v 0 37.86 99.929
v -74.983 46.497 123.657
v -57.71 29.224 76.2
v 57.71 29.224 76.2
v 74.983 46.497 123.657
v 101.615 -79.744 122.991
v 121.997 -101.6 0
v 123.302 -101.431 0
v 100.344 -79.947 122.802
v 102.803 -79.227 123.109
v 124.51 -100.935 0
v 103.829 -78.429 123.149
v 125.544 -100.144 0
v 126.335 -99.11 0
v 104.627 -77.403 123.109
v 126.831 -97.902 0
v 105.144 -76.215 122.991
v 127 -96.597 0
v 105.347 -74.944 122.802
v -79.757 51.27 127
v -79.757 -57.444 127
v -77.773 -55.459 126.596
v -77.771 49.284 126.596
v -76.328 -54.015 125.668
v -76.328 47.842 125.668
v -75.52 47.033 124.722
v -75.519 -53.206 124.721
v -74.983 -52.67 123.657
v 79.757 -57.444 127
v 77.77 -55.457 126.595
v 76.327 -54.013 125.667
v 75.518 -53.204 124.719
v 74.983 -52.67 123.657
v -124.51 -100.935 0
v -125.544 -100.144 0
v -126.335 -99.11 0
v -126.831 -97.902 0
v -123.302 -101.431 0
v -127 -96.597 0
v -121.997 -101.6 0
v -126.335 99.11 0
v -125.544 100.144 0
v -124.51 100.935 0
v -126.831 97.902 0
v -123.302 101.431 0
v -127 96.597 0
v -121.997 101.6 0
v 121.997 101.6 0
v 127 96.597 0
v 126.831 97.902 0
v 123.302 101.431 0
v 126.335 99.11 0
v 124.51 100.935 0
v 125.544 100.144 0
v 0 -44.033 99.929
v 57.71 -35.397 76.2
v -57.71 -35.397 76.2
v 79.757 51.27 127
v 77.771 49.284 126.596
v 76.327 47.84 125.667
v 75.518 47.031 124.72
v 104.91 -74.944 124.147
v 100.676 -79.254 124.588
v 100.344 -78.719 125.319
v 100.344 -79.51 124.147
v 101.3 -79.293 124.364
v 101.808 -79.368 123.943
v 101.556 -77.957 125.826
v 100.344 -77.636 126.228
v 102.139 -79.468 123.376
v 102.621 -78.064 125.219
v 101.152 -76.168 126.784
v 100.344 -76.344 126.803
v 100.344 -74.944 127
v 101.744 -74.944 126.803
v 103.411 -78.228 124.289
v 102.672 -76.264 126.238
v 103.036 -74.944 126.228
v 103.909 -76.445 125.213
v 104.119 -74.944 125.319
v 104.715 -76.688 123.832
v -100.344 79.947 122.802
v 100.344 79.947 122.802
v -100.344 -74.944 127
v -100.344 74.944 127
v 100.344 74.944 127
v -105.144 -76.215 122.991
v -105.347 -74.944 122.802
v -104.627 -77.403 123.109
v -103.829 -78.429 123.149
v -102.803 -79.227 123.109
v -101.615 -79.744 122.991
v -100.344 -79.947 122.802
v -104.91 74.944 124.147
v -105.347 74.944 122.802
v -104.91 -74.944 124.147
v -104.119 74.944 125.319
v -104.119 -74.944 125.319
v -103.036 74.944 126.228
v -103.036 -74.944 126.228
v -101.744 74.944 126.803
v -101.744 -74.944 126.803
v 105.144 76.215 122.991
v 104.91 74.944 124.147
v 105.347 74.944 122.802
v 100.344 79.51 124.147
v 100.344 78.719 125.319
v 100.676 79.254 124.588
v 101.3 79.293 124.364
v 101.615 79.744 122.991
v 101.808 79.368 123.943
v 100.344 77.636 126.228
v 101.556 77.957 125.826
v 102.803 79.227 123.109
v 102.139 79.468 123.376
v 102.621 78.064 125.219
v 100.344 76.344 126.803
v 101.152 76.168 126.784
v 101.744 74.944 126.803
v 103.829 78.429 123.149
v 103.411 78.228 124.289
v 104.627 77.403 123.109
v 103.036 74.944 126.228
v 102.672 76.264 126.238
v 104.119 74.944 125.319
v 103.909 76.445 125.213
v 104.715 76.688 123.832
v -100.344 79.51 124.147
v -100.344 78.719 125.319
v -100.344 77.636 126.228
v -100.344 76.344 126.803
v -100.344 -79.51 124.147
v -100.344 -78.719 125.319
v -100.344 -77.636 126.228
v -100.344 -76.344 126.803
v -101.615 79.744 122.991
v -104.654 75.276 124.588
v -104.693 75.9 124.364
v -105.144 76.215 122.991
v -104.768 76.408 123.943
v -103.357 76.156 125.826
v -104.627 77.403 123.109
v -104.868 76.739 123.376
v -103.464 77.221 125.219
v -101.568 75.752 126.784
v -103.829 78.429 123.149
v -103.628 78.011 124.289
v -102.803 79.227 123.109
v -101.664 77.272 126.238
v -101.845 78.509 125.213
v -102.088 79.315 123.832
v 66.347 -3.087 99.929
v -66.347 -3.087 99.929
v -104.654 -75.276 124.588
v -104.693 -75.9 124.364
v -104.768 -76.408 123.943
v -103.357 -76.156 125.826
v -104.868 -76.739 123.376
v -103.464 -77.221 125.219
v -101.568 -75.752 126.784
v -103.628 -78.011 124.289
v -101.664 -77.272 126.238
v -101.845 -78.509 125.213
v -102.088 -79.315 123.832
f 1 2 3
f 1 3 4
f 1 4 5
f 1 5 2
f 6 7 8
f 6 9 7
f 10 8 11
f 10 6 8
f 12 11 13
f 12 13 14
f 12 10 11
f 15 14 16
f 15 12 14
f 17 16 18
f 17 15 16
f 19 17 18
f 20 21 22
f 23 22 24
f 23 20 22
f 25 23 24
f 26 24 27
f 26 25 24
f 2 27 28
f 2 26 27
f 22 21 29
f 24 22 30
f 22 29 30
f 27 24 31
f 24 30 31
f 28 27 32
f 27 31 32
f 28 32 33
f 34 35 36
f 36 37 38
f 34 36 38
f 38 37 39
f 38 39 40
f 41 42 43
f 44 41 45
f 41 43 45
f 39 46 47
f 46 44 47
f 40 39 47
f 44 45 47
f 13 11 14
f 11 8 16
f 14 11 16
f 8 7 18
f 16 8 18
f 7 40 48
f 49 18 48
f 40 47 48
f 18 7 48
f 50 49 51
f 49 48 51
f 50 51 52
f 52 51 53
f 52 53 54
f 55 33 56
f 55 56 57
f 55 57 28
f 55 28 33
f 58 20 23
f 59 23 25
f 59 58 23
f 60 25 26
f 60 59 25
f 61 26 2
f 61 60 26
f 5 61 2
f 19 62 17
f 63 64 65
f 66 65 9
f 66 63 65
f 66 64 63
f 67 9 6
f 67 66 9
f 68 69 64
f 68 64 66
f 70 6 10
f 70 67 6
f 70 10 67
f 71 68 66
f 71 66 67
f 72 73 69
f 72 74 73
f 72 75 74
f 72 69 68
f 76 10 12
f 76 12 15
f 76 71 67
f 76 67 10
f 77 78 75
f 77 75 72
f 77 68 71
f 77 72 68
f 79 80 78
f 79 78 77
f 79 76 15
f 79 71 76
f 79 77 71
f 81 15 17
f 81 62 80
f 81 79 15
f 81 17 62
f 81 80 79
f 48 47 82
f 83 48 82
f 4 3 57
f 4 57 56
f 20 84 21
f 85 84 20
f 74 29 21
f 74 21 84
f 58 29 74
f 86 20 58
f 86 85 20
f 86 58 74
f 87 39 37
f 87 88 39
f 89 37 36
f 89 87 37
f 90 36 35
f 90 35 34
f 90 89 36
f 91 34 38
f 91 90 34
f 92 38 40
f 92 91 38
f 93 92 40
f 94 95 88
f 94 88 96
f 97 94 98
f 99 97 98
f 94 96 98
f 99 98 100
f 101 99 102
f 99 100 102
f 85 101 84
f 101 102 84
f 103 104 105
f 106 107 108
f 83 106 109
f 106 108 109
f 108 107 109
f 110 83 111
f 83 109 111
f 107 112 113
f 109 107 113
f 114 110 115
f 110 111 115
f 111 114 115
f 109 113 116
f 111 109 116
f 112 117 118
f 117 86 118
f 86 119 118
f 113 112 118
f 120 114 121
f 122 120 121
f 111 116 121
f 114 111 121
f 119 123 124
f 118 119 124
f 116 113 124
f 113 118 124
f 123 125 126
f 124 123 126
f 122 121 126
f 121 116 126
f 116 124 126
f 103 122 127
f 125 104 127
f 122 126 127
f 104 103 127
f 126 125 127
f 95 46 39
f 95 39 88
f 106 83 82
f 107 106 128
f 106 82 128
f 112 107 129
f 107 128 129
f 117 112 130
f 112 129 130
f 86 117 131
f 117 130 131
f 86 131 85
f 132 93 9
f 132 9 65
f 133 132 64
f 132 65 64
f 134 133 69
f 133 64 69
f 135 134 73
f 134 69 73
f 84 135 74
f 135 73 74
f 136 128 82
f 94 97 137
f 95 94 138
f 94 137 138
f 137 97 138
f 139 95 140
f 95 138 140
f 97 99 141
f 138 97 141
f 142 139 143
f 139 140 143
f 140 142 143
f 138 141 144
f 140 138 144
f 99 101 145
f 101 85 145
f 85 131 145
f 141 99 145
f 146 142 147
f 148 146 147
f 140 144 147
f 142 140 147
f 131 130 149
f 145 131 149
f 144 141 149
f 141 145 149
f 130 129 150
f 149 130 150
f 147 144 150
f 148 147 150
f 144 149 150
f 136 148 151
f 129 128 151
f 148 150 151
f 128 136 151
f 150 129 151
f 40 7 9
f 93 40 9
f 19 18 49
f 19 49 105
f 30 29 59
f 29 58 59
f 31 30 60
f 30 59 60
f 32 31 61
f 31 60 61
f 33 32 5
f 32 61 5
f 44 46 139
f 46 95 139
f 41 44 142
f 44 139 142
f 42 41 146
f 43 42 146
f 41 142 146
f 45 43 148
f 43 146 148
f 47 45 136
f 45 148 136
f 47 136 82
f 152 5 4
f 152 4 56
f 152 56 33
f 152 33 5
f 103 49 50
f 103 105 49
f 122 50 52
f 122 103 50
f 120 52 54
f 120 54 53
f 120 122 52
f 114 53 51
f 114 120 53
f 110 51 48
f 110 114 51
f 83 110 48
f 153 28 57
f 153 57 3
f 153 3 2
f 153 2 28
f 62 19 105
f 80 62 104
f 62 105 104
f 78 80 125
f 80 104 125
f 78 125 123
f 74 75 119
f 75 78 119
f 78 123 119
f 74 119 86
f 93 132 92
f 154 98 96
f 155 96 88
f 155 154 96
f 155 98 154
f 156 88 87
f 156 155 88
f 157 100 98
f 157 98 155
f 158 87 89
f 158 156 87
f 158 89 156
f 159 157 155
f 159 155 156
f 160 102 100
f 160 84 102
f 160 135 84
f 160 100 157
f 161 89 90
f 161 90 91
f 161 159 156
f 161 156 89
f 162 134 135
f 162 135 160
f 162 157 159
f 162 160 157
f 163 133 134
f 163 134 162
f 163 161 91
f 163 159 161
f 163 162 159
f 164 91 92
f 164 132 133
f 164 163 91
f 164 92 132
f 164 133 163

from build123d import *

# Parameters (mm, degrees)
F0_W     = 254
F0_H     = 203.2
F1_DEPTH = 127
F1_TAPER = 10
F2_W     = 152.4
F2_H     = 101.6
F3_DEPTH = 50.8
F3_TAPER = 20
F4_R     = 5.08


with BuildPart() as f1:
    # F0 (on Top) → F1 (new body)
    with BuildSketch(Plane.XY):
        Rectangle(F0_W, F0_H)
    extrude(amount=F1_DEPTH, taper=F1_TAPER)

    # F2 (on face) → F3 (cut)
    with BuildSketch(Plane.XY.offset(127)):
        with Locations((0, -3.0865822919)):
            Rectangle(F2_W, F2_H)
    extrude(amount=-F3_DEPTH, taper=F3_TAPER, mode=Mode.SUBTRACT)

    # F4
    f4_edges = [f1.edges().sort_by_distance(p)[0] for p in [
        (104.606473, 0, 127),
        (0, -79.206473, 127),
        (0, 79.206473, 127),
        (-104.606473, 0, 127),
        (76.2, -3.086582, 127),
        (0, 47.713418, 127),
        (-76.2, -3.086582, 127),
        (0, -53.886582, 127),
        (-115.803237, 90.403237, 63.5),
        (115.803237, 90.403237, 63.5),
        (115.803237, -90.403237, 63.5),
        (-115.803237, -90.403237, 63.5),
    ]]
    fillet(f4_edges, radius=F4_R)


solid = f1.part
